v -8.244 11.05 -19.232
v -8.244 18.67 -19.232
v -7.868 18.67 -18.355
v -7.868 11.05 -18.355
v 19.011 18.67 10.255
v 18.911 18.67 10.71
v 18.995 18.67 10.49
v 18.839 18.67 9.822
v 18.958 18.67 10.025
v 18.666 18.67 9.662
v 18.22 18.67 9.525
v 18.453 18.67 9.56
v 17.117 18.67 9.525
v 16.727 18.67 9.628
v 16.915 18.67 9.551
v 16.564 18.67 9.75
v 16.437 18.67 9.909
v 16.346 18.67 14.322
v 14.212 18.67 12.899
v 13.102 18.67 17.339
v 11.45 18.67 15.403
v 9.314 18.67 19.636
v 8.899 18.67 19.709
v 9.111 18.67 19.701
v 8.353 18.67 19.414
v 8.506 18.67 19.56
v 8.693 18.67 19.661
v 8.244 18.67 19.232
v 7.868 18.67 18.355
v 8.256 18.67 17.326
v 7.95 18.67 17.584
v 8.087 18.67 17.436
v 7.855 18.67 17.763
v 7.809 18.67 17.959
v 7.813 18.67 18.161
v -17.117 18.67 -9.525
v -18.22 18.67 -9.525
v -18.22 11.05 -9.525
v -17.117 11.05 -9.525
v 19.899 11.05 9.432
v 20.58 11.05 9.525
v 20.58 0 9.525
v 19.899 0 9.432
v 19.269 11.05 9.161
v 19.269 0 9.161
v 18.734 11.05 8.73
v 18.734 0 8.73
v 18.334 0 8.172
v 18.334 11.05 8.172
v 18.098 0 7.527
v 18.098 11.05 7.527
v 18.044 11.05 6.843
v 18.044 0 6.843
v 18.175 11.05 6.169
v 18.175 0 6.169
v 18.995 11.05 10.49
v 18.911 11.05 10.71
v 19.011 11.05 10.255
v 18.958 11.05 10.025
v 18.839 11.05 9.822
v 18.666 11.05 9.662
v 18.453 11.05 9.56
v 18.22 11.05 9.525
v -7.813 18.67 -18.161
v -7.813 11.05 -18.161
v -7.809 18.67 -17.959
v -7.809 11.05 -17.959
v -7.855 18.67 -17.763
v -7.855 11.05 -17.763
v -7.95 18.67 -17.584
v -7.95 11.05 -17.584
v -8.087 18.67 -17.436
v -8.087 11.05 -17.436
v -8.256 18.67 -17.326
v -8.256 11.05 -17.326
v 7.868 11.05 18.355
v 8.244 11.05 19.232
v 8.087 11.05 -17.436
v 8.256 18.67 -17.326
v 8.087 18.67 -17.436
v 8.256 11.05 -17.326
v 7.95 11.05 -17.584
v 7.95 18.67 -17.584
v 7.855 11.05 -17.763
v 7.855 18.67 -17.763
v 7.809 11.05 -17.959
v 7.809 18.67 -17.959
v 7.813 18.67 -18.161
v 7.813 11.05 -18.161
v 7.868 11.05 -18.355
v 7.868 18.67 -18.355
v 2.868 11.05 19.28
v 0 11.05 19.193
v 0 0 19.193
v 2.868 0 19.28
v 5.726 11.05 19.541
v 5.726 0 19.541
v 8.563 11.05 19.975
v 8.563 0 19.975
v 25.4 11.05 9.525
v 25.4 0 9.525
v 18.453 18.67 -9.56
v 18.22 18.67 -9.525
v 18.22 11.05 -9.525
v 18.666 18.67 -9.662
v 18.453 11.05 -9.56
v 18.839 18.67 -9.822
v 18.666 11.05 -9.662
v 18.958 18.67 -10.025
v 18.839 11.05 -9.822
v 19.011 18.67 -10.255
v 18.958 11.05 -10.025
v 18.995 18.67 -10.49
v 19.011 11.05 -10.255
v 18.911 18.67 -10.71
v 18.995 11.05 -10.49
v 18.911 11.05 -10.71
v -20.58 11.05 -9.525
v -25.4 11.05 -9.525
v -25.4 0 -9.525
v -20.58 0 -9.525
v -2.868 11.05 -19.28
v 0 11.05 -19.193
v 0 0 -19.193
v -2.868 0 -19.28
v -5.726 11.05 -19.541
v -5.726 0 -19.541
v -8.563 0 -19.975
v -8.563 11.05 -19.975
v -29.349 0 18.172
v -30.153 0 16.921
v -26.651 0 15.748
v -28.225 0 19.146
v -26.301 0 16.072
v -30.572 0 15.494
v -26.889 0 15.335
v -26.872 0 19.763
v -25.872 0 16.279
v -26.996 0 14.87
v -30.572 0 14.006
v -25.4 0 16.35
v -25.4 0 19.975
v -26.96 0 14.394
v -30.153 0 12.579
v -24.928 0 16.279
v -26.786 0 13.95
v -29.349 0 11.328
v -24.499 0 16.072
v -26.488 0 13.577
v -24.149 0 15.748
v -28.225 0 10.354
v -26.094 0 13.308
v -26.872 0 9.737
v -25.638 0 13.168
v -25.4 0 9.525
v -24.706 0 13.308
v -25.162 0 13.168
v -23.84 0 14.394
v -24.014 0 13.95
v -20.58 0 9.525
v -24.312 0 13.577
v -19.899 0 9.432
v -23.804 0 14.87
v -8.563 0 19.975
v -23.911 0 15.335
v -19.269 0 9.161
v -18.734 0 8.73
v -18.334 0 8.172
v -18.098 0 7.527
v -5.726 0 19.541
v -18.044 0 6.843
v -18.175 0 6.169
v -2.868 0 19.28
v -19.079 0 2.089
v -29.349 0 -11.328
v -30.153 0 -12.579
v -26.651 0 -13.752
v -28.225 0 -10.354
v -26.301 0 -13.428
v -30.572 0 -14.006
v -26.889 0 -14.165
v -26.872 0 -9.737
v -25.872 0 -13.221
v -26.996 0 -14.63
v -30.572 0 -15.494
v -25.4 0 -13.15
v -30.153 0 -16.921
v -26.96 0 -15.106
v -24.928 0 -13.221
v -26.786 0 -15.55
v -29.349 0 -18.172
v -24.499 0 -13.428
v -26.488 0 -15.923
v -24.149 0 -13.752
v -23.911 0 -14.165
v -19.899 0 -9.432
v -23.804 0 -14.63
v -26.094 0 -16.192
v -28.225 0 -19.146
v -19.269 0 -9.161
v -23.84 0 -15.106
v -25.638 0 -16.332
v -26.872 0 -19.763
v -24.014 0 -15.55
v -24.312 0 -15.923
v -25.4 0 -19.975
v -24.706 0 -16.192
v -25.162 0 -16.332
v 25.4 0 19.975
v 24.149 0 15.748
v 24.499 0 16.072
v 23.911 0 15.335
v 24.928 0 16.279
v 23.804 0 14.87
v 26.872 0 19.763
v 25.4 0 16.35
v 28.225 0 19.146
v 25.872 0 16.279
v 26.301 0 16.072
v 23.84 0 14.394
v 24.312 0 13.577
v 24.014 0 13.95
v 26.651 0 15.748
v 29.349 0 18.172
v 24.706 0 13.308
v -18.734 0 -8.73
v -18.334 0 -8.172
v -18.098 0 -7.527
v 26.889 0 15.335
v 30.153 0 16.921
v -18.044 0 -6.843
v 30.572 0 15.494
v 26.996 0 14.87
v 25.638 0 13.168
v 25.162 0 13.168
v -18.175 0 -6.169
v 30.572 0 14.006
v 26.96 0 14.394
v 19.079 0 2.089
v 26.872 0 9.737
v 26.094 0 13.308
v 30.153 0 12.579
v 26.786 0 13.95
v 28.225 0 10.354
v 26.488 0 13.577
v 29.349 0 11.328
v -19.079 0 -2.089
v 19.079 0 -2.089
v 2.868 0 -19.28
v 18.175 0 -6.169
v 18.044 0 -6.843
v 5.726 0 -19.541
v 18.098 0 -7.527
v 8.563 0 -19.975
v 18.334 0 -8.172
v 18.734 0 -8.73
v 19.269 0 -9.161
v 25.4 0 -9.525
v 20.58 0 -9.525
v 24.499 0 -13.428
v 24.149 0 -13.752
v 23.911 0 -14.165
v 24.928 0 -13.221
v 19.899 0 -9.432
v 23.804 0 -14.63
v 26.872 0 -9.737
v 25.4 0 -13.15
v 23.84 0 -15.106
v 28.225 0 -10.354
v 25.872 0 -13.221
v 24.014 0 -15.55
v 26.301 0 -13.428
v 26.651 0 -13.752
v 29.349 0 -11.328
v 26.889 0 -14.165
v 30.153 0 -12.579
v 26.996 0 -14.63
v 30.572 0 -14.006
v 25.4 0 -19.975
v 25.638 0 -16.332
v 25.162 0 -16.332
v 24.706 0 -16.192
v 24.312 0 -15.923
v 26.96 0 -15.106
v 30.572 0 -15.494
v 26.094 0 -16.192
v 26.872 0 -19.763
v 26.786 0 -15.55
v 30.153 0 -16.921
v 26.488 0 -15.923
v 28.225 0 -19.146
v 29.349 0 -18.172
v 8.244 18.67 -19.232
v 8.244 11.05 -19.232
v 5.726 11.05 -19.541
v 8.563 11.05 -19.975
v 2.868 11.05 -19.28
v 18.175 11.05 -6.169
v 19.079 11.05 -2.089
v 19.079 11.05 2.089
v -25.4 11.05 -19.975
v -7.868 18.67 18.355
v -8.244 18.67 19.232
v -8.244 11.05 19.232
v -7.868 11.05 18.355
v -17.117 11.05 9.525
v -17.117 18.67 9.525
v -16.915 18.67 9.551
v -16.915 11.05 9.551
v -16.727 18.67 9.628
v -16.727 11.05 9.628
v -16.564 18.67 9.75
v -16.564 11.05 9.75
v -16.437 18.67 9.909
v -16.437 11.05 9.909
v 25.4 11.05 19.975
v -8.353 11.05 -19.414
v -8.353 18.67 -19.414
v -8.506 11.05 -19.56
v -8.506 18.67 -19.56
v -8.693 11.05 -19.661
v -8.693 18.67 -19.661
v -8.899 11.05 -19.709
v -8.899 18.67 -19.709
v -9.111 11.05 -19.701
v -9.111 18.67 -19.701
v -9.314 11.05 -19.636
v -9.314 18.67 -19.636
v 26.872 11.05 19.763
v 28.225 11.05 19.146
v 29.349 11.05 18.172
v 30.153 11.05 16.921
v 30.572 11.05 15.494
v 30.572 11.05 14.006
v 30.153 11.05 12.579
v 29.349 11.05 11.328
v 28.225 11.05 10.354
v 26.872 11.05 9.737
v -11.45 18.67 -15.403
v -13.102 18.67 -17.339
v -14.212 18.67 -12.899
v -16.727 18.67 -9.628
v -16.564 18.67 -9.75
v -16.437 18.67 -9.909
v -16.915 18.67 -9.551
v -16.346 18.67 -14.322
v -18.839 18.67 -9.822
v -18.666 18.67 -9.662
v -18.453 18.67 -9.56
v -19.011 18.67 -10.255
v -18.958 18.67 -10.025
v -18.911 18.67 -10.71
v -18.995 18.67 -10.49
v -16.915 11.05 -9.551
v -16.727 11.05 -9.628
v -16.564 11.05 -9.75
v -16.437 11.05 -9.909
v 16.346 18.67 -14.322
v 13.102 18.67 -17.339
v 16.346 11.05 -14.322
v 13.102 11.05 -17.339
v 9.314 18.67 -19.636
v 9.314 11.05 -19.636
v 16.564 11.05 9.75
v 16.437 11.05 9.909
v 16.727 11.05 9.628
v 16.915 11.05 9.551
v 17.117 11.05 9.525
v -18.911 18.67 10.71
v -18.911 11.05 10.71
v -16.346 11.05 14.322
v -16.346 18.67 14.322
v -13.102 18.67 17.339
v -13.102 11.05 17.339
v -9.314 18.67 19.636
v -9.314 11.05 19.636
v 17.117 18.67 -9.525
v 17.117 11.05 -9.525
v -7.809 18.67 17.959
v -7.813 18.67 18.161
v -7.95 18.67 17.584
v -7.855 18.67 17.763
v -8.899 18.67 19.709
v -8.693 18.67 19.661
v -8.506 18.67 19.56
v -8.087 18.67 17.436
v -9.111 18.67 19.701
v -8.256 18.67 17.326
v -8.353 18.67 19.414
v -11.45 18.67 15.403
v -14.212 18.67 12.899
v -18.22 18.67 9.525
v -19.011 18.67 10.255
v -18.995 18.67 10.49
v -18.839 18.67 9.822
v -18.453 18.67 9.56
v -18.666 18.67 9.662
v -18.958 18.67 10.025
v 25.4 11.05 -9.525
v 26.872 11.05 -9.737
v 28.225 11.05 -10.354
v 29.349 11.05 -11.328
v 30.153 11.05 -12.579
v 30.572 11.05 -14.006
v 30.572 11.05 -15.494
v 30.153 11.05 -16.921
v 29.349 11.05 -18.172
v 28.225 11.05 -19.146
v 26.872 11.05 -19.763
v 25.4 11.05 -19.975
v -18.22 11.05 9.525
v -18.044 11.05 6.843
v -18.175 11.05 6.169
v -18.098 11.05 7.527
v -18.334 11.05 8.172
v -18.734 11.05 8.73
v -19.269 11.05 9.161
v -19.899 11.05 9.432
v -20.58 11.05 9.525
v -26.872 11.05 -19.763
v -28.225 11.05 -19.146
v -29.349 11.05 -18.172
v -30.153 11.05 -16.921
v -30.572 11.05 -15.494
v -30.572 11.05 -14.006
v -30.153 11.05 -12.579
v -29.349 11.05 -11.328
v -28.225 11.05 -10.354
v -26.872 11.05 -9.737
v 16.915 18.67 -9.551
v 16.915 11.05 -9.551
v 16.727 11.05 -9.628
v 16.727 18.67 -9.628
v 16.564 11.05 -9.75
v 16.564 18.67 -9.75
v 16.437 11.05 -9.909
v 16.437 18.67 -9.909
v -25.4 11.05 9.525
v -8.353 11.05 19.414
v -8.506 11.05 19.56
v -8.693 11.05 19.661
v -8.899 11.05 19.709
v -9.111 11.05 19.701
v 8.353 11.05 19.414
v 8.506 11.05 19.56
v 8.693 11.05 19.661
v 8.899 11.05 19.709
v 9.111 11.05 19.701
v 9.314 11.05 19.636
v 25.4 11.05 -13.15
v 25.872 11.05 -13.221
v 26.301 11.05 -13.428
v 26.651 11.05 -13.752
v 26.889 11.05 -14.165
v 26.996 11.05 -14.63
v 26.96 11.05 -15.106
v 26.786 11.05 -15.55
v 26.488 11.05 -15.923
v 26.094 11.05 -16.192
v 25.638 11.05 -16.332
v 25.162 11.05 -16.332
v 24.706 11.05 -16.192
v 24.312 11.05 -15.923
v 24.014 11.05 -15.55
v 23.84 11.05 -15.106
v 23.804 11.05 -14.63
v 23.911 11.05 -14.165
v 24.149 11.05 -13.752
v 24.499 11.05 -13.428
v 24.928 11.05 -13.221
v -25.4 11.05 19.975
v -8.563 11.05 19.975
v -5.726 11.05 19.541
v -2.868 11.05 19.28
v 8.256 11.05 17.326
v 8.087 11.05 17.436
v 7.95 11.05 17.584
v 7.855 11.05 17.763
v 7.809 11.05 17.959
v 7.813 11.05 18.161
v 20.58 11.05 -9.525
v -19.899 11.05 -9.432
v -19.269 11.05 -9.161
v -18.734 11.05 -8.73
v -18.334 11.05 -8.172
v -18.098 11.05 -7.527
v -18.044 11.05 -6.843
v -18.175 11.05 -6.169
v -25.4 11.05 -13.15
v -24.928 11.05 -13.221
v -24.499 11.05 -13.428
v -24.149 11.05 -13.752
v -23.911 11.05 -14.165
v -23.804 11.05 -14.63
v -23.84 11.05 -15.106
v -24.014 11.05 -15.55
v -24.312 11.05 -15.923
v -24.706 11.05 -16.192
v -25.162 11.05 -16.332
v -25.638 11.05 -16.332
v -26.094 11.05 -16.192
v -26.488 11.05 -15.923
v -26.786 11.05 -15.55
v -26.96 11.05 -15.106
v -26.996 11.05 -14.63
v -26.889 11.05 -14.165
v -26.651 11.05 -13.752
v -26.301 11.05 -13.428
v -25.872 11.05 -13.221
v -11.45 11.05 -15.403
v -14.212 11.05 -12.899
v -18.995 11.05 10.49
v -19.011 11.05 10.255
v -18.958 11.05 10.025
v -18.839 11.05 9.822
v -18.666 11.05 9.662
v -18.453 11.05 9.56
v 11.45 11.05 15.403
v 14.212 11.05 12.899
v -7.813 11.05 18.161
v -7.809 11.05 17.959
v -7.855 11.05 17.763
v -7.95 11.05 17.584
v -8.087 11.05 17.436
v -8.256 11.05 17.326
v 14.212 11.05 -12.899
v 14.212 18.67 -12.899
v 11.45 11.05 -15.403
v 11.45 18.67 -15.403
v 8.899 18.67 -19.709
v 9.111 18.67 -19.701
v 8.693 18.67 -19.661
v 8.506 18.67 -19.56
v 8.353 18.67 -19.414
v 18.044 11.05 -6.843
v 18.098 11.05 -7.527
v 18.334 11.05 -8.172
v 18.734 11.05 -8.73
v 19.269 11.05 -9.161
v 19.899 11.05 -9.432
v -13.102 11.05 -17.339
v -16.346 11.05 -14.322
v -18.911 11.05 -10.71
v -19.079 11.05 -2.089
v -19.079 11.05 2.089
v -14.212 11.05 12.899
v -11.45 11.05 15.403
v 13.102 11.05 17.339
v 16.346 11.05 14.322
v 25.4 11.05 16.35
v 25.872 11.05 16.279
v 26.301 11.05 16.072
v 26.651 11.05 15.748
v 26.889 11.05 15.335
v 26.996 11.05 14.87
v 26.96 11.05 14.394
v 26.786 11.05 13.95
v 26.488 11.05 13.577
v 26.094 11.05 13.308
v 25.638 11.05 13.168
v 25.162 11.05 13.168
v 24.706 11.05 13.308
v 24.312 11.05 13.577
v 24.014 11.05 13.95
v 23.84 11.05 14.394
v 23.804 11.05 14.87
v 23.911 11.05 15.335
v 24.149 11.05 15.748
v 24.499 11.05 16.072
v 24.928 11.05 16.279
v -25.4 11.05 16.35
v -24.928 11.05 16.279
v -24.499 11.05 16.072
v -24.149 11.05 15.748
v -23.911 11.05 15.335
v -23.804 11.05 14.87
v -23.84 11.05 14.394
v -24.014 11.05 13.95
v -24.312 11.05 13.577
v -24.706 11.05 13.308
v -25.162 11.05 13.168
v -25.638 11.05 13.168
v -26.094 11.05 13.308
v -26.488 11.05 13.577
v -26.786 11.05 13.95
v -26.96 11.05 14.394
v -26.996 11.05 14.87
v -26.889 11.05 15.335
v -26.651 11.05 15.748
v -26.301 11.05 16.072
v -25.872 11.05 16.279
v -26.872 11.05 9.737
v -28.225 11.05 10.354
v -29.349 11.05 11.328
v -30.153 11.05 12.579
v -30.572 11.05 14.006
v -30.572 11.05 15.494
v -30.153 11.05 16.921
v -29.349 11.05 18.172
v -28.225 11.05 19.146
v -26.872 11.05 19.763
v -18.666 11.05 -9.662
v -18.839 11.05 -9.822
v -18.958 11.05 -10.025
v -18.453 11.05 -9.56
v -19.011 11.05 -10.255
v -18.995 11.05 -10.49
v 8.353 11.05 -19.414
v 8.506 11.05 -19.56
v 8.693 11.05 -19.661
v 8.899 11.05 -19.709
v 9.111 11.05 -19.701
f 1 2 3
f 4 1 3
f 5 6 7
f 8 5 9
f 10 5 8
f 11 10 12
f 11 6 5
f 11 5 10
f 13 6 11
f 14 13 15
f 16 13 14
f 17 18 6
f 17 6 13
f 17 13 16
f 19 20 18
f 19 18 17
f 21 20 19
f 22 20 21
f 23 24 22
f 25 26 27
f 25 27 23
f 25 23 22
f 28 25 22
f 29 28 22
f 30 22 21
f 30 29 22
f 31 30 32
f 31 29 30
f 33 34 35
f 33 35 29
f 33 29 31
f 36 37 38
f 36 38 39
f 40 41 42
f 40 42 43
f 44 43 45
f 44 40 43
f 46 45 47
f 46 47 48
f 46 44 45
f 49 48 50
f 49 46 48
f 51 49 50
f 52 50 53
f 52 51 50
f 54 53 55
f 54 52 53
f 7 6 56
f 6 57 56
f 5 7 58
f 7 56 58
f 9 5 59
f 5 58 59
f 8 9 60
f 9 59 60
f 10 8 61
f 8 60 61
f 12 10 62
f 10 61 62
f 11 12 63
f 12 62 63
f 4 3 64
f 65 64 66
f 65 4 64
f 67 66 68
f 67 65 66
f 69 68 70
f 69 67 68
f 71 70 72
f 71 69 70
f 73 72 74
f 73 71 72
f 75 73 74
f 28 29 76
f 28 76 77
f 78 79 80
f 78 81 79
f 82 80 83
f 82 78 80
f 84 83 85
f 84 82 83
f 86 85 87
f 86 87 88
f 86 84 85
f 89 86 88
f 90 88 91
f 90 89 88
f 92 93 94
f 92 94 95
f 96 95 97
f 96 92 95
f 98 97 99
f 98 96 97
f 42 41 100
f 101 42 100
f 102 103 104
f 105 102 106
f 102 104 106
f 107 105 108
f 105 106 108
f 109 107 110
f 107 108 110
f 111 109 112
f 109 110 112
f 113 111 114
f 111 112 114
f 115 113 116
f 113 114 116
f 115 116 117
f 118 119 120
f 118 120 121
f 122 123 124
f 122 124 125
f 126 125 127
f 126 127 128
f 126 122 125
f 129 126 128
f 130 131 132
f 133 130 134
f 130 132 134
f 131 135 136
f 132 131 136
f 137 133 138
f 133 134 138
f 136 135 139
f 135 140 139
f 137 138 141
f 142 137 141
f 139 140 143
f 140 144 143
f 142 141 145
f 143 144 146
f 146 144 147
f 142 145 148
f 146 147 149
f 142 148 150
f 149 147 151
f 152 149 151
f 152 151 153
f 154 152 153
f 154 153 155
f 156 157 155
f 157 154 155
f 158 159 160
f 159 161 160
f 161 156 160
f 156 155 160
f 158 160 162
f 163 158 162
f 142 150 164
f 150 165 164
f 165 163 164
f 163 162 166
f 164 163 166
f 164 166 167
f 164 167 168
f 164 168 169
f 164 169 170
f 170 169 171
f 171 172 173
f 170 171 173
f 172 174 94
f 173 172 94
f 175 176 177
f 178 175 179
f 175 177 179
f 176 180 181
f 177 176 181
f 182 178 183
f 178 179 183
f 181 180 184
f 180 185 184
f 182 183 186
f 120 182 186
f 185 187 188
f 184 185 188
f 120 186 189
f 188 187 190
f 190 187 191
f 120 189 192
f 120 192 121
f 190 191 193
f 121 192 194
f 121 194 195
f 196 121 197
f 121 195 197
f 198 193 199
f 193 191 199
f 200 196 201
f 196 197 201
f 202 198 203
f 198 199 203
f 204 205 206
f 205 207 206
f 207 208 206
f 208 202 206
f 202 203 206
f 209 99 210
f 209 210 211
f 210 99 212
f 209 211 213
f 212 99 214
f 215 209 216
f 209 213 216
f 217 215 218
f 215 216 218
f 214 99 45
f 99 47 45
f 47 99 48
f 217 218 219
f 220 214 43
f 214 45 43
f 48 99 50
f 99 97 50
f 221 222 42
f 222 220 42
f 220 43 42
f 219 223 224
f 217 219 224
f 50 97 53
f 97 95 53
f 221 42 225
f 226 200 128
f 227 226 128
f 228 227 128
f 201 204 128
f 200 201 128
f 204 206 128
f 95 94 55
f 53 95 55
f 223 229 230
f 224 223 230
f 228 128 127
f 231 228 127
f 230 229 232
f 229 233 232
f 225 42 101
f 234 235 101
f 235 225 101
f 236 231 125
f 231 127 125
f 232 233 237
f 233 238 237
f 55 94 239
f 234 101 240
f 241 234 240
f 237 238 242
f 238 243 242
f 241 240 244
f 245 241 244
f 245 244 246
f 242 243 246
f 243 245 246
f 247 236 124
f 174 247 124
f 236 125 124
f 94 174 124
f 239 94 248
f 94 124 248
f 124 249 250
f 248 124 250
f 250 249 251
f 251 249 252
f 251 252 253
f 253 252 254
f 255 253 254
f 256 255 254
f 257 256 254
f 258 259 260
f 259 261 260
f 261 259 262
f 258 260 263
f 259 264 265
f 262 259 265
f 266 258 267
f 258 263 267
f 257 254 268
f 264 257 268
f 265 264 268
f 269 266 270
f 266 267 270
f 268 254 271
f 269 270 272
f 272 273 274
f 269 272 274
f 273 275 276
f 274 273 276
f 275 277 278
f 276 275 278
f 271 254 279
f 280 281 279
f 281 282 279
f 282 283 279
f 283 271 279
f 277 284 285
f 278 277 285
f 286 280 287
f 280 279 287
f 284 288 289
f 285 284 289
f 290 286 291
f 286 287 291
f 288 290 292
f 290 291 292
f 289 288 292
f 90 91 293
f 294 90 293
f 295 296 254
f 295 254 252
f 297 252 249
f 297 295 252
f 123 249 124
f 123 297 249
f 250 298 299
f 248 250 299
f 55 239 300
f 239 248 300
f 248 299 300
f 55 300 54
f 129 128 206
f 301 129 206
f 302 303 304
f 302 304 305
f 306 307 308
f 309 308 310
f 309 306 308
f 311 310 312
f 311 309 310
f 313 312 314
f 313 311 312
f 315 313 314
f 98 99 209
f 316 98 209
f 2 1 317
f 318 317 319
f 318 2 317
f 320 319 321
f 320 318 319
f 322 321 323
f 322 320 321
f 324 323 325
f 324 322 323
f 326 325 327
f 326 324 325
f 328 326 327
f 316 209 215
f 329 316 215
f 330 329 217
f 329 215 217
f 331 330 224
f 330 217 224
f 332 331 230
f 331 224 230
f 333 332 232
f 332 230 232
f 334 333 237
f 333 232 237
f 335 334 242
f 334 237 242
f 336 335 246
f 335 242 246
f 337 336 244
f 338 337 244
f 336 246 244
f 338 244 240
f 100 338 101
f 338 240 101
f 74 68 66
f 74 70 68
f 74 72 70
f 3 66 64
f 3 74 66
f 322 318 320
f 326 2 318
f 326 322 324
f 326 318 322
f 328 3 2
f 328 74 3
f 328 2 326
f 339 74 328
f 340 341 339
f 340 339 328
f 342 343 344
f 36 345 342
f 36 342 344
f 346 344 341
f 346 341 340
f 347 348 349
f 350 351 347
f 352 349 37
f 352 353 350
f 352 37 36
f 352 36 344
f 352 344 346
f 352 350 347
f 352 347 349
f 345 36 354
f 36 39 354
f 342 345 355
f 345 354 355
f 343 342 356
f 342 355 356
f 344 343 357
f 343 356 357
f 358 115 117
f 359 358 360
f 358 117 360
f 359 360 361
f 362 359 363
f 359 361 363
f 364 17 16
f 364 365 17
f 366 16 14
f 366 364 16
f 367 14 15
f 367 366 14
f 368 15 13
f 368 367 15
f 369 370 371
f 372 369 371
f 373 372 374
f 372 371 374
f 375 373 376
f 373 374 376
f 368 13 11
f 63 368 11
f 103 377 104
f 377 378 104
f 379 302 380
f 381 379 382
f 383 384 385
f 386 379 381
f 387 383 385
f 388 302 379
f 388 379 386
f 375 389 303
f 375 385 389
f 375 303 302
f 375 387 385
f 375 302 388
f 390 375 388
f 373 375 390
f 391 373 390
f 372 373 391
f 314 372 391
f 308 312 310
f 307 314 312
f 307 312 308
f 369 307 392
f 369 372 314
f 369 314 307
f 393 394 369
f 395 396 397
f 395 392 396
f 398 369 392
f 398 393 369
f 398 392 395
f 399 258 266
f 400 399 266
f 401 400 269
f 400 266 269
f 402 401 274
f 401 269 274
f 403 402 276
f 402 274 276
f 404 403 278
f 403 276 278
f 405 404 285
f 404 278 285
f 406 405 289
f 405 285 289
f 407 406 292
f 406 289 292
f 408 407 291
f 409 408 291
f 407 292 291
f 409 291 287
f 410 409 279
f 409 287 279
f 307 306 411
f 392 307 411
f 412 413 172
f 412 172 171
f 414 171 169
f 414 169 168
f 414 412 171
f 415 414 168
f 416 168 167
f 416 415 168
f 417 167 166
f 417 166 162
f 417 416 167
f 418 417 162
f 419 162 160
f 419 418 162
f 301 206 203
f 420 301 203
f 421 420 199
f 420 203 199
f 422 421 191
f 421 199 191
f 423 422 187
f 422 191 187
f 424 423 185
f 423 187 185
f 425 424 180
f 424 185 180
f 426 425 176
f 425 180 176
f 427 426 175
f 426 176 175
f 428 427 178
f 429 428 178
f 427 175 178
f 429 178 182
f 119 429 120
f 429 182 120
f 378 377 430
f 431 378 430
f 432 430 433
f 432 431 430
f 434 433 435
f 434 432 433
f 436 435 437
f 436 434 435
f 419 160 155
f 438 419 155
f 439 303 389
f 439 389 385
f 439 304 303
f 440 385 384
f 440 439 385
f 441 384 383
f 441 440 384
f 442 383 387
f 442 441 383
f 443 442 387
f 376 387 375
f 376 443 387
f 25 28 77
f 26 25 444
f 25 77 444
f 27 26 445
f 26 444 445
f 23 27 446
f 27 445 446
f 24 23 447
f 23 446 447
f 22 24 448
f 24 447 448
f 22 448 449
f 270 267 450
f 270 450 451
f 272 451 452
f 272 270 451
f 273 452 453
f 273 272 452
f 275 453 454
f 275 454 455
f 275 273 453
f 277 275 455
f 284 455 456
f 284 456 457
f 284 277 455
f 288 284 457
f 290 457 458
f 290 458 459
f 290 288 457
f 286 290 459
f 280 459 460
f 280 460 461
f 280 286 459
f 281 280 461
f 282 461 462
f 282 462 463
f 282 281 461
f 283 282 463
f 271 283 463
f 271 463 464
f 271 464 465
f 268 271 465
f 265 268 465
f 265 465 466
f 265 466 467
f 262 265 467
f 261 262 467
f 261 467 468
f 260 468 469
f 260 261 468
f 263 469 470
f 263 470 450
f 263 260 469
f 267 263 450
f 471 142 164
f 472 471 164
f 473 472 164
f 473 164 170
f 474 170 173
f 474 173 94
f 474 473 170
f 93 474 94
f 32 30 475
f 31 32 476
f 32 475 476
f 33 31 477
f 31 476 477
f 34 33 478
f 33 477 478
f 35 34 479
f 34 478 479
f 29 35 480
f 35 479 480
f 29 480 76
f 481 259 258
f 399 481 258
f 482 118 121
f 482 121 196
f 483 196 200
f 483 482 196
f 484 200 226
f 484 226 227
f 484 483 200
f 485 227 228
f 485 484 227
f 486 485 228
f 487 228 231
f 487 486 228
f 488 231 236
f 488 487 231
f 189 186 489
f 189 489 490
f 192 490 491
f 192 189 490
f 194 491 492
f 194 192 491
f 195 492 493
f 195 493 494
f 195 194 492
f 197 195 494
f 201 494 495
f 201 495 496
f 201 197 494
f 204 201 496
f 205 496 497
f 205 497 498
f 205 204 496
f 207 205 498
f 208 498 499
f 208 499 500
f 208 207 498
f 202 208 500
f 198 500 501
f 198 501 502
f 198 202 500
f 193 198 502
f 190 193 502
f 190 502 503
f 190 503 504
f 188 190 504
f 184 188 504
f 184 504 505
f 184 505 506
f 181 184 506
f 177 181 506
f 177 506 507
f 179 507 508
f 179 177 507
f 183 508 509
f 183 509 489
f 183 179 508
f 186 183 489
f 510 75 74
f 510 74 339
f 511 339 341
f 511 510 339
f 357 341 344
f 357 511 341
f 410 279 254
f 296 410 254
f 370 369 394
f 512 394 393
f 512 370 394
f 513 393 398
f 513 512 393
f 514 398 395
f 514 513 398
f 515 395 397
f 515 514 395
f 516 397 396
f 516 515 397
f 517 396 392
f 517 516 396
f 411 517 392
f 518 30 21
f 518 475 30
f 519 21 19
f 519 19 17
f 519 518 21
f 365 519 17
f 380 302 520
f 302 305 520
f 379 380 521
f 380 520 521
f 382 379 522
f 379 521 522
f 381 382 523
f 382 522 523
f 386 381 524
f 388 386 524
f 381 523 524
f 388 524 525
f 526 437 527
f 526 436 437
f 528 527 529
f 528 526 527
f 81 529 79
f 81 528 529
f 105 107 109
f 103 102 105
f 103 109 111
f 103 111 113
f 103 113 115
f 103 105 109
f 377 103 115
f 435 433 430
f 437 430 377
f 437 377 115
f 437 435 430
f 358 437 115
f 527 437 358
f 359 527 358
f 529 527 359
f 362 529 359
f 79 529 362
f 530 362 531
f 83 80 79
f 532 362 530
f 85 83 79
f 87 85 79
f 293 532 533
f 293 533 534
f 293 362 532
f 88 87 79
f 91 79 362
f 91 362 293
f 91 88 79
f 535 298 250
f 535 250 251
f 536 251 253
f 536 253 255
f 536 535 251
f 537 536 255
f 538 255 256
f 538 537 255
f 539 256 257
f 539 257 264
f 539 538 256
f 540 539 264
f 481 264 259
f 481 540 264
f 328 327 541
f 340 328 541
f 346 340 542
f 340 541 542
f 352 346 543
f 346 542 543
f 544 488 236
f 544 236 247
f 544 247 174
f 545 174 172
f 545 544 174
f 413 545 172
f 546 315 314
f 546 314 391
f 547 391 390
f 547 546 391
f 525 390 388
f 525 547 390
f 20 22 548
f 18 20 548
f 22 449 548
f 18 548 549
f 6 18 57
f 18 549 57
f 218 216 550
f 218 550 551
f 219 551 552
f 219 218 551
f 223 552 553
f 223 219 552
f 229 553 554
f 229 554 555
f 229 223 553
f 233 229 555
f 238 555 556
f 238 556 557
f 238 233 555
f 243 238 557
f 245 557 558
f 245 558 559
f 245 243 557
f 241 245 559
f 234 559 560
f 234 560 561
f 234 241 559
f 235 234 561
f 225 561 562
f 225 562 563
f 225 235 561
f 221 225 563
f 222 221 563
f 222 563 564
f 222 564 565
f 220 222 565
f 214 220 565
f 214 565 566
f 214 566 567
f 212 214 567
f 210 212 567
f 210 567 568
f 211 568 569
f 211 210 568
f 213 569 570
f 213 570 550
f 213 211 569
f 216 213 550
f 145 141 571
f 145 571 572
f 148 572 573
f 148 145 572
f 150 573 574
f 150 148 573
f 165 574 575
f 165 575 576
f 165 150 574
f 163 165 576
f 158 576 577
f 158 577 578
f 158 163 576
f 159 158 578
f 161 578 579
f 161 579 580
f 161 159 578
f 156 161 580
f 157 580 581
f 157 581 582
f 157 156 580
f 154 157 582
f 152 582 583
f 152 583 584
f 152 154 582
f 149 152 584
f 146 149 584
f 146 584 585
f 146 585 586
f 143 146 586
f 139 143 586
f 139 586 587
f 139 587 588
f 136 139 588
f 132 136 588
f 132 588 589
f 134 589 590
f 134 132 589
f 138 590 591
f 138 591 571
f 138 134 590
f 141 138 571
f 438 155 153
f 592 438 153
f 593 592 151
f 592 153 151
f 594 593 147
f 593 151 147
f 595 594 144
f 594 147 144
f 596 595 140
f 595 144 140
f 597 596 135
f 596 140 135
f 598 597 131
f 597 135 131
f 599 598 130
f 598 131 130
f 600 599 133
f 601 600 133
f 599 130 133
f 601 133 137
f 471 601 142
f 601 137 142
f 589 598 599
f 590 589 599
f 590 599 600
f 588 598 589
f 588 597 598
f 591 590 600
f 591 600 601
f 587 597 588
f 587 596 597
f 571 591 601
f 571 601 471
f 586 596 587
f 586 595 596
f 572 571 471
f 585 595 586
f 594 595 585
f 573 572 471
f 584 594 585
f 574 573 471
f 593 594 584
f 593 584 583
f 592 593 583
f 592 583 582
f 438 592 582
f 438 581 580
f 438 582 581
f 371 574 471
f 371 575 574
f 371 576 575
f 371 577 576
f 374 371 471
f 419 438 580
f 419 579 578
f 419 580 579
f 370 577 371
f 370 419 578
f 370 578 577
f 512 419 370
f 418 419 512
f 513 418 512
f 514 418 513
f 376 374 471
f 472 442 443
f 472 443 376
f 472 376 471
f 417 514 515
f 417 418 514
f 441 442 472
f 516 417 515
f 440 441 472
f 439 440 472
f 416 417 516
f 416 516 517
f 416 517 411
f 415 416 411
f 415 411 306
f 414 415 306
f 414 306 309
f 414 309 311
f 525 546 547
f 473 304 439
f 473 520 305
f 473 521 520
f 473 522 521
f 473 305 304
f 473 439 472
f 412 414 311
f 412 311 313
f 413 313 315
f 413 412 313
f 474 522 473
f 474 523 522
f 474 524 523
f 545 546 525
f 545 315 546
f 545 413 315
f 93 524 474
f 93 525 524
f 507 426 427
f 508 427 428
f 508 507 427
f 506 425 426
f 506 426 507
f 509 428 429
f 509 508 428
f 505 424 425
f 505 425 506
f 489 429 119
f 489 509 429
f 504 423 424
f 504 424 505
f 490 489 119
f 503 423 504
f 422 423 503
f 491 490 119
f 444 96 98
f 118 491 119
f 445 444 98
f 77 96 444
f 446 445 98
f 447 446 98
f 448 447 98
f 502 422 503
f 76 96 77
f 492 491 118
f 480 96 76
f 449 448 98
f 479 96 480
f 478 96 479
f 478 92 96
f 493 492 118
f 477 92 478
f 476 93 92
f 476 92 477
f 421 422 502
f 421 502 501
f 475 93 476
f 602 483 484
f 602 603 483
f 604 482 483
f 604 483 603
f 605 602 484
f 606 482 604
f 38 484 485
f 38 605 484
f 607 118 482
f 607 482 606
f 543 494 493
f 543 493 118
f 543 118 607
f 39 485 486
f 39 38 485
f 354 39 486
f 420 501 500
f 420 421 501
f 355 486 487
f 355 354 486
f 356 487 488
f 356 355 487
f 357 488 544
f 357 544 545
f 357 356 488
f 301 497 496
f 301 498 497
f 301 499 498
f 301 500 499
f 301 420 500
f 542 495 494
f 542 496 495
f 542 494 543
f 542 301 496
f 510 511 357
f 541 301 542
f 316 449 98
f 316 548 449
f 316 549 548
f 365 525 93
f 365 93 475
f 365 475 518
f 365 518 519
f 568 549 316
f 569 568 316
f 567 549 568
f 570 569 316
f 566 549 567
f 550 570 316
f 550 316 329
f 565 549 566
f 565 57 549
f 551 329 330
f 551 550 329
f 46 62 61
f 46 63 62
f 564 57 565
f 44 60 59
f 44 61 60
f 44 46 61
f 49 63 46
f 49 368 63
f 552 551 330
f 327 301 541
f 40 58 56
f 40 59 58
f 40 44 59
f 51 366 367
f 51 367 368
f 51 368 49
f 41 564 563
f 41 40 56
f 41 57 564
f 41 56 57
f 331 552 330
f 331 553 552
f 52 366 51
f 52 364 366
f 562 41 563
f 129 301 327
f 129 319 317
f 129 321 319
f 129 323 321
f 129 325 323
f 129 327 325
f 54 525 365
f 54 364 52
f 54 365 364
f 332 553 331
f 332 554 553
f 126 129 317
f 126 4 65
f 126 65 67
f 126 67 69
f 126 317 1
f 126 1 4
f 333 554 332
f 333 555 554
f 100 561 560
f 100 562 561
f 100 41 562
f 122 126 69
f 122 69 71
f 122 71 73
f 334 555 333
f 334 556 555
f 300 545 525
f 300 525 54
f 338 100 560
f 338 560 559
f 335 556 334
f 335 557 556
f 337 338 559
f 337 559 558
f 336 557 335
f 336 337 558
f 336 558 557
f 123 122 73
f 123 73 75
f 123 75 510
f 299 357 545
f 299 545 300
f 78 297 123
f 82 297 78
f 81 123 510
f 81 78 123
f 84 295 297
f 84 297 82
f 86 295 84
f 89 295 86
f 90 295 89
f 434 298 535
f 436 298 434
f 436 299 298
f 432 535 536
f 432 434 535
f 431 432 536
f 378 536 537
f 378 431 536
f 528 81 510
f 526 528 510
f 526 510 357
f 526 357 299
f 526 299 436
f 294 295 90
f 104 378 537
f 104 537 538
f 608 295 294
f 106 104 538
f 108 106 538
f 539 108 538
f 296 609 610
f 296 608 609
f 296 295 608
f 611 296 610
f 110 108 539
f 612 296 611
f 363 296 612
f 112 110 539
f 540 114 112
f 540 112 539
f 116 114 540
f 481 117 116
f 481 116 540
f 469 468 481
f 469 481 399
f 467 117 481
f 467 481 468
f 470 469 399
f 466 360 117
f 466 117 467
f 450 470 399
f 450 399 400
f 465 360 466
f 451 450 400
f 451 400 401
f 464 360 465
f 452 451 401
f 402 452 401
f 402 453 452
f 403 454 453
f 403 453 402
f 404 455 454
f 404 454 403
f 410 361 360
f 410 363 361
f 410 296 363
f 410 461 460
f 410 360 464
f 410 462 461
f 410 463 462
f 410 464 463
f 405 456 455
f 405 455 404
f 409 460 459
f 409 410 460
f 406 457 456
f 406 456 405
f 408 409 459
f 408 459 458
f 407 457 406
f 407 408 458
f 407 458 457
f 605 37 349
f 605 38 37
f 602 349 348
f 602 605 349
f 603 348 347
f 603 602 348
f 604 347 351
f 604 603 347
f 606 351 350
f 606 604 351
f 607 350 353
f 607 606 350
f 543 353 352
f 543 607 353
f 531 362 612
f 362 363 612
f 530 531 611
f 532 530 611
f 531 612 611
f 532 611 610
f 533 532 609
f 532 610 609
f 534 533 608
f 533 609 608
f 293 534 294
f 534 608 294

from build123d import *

# Parameters (mm, degrees)
SKETCH1_R           = 1.6
SKETCH1_R_2         = 21.732875
SKETCH1_R_3         = 19.192875
BOSS_EXTRUDE1_DEPTH = 11.05
BOSS_EXTRUDE2_START = 11.05
SKETCH1_3_R         = 21.732875
SKETCH1_3_R_2       = 19.192875
BOSS_EXTRUDE2_DEPTH = 7.62
CUT_EXTRUDE1_DEPTH  = 42.937776077
FILLET2_R           = 0.79375
FILLET4_R           = 2.54
FILLET5_R           = 2.54
FILLET6_R           = 2.54
FILLET7_R           = 2.54
BOSS_EXTRUDE3_DEPTH = 11.05


with BuildPart() as part:
    # Sketch1 → Boss-Extrude1 (new body)
    # profile 1 of 6: a face of its own
    with BuildSketch(Plane(origin=(0, 0, 0), x_dir=(1, 0, 0), z_dir=(0, 1, 0))):
        with BuildLine():
            Line((-8.562572408, 19.9749896), (-25.4, 19.9749896))
            ThreePointArc((-25.4, 19.9749896), (-30.6249948, 14.7499948), (-25.4, 9.525))
            Line((-25.4, 9.525), (-19.534385856, 9.525))
            ThreePointArc((-19.534385856, 9.525), (-14.98867361, 15.737138215), (-8.562572408, 19.9749896))
        make_face()
        with Locations(Location((-25.4, 14.7499948, 0), (0, 0, 270))):
            Circle(SKETCH1_R, mode=Mode.SUBTRACT)
    # profile 2 of 6: a face of its own
    with BuildSketch(Plane(origin=(0, 0, 0), x_dir=(1, 0, 0), z_dir=(0, 1, 0))):
        Circle(SKETCH1_R_2)
        Circle(SKETCH1_R_3, mode=Mode.SUBTRACT)
    # profile 3 of 6: a face of its own
    with BuildSketch(Plane(origin=(0, 0, 0), x_dir=(1, 0, 0), z_dir=(0, 1, 0))):
        with BuildLine():
            Line((25.4, 19.9749896), (8.562572408, 19.9749896))
            ThreePointArc((8.562572408, 19.9749896), (14.98867361, 15.737138215), (19.534385856, 9.525))
            Line((19.534385856, 9.525), (25.4, 9.525))
            ThreePointArc((25.4, 9.525), (30.6249948, 14.7499948), (25.4, 19.9749896))
        make_face()
        with Locations(Location((25.4, 14.7499948, 0), (0, 0, 270))):
            Circle(SKETCH1_R, mode=Mode.SUBTRACT)
    # profile 4 of 6: a face of its own
    with BuildSketch(Plane(origin=(0, 0, 0), x_dir=(1, 0, 0), z_dir=(0, 1, 0))):
        with BuildLine():
            Line((25.4, -9.525), (19.534385856, -9.525))
            ThreePointArc((19.534385856, -9.525), (14.98867361, -15.737138215), (8.562572408, -19.9749896))
            Line((8.562572408, -19.9749896), (25.4, -19.9749896))
            ThreePointArc((25.4, -19.9749896), (30.6249948, -14.7499948), (25.4, -9.525))
        make_face()
        with Locations(Location((25.4, -14.7499948, 0), (0, 0, 270))):
            Circle(SKETCH1_R, mode=Mode.SUBTRACT)
    # profile 5 of 6: a face of its own
    with BuildSketch(Plane(origin=(0, 0, 0), x_dir=(1, 0, 0), z_dir=(0, 1, 0))):
        with BuildLine():
            ThreePointArc((-8.562572408, -19.9749896), (-14.98867361, -15.737138215), (-19.534385856, -9.525))
            Line((-19.534385856, -9.525), (-25.4, -9.525))
            ThreePointArc((-25.4, -9.525), (-30.6249948, -14.7499948), (-25.4, -19.9749896))
            Line((-25.4, -19.9749896), (-8.562572408, -19.9749896))
        make_face()
        with Locations(Location((-25.4, -14.7499948, 0), (0, 0, 270))):
            Circle(SKETCH1_R, mode=Mode.SUBTRACT)
    # profile 6 of 6: a face of its own
    with BuildSketch(Plane(origin=(0, 0, 0), x_dir=(1, 0, 0), z_dir=(0, 1, 0))):
        Circle(SKETCH1_R_3)
    extrude(amount=BOSS_EXTRUDE1_DEPTH)

    # Sketch1<3> → Boss-Extrude2 (add)
    with BuildSketch(Plane(origin=(0, 0, 0), x_dir=(1, 0, 0), z_dir=(0, 1, 0)).offset(BOSS_EXTRUDE2_START)):
        with Locations(Location((0, 0, 0), (0, 0, 113.203103919))):
            Circle(SKETCH1_3_R)
        with Locations(Location((0, 0, 0), (0, 0, 90))):
            Circle(SKETCH1_3_R_2, mode=Mode.SUBTRACT)
    extrude(amount=BOSS_EXTRUDE2_DEPTH)

    # Sketch2 → Cut-Extrude1 (cut, through all)
    with BuildSketch(Plane(origin=(0, 18.67, 0), x_dir=(1, 0, 0), z_dir=(0, 1, 0))):
        with BuildLine():
            Line((-19.534385856, 9.525), (-16.6625576, 9.525))
            ThreePointArc((-16.6625576, 9.525), (-19.192875, 0), (-16.6625576, -9.525))
            Line((-16.6625576, -9.525), (-19.534385856, -9.525))
            ThreePointArc((-19.534385856, -9.525), (-21.732875, 0), (-19.534385856, 9.525))
        make_face()
        with BuildLine():
            Line((19.534385856, 9.525), (16.6625576, 9.525))
            ThreePointArc((16.6625576, 9.525), (19.192875, 0), (16.6625576, -9.525))
            Line((16.6625576, -9.525), (19.534385856, -9.525))
            ThreePointArc((19.534385856, -9.525), (21.732875, 0), (19.534385856, 9.525))
        make_face()
        with BuildLine():
            Line((-8.562572408, 19.9749896), (-7.561833485, 17.640440049))
            ThreePointArc((-7.561833485, 17.640440049), (0, 19.192875), (7.561833485, 17.640440049))
            Line((7.561833485, 17.640440049), (8.562572408, 19.9749896))
            ThreePointArc((8.562572408, 19.9749896), (0, 21.732875), (-8.562572408, 19.9749896))
        make_face()
        with BuildLine():
            Line((-8.562572408, -19.9749896), (-7.561833485, -17.640440049))
            ThreePointArc((-7.561833485, -17.640440049), (0, -19.192875), (7.561833485, -17.640440049))
            Line((7.561833485, -17.640440049), (8.562572408, -19.9749896))
            ThreePointArc((8.562572408, -19.9749896), (0, -21.732875), (-8.562572408, -19.9749896))
        make_face()
    extrude(amount=-CUT_EXTRUDE1_DEPTH, mode=Mode.SUBTRACT)

    # Fillet2
    fillet2_edges = [part.edges().sort_by_distance(p)[0] for p in [
        (16.6625576, 14.86, 9.525),
        (19.534385856, 14.86, -9.525),
        (19.534385856, 14.86, 9.525),
        (16.6625576, 14.86, -9.525),
        (7.561833485, 14.86, -17.640440049),
        (-8.562572408, 14.86, -19.9749896),
        (8.562572408, 14.86, -19.9749896),
        (-7.561833485, 14.86, -17.640440049),
        (-16.6625576, 14.86, -9.525),
        (-19.534385856, 14.86, 9.525),
        (-19.534385856, 14.86, -9.525),
        (-16.6625576, 14.86, 9.525),
        (-7.561833485, 14.86, 17.640440049),
        (8.562572408, 14.86, 19.9749896),
        (-8.562572408, 14.86, 19.9749896),
        (7.561833485, 14.86, 17.640440049),
    ]]
    fillet(fillet2_edges, radius=FILLET2_R)

    # Fillet4
    # the kernel refuses this fillet: 2.54 mm, written as the material it adds along each edge
    with BuildSketch(Plane(origin=(16.6625576, 11.05, 9.525), x_dir=(1, 0, 0), z_dir=(0, -1, 0))) as fillet4_piece_1:
        with BuildLine():
            CenterArc((3.917229347, -2.54), FILLET4_R, 90, 108.747762366)
            ThreePointArc((1.511994934, -3.356362308), (0.836652457, -1.641847194), (0, 0))
            Line((0, 0), (3.917229347, 0))
        make_face()
    extrude(amount=11.05)

    # Fillet5
    # the kernel refuses this fillet: 2.54 mm, written as the material it adds along each edge
    with BuildSketch(Plane(origin=(16.6625576, 11.05, -9.525), x_dir=(0.41073329589504654, 0, 0.9117555372155368), z_dir=(0, -1, 0))) as fillet5_piece_1:
        with BuildLine():
            CenterArc((3.924795585, -2.528292976), FILLET5_R, 95.503145264, 108.747762366)
            Line((1.60893652, -3.571555547), (0, 0))
            ThreePointArc((0, 0), (1.840604291, -0.088461201), (3.681208582, 0))
        make_face()
    extrude(amount=11.05)

    # Fillet6
    # the kernel refuses this fillet: 2.54 mm, written as the material it adds along each edge
    with BuildSketch(Plane(origin=(-16.6625576, 11.05, -9.525), x_dir=(-1, 0, 0), z_dir=(0, -1, 0))) as fillet6_piece_1:
        with BuildLine():
            CenterArc((3.917229347, -2.54), FILLET6_R, 90, 108.747762366)
            ThreePointArc((1.511994934, -3.356362308), (0.836652457, -1.641847194), (0, 0))
            Line((0, 0), (3.917229347, 0))
        make_face()
    extrude(amount=11.05)

    # Fillet7
    # the kernel refuses this fillet: 2.54 mm, written as the material it adds along each edge
    with BuildSketch(Plane(origin=(-16.6625576, 11.05, 9.525), x_dir=(-0.41073329589504604, 0, -0.9117555372155371), z_dir=(0, -1, 0))) as fillet7_piece_1:
        with BuildLine():
            CenterArc((3.924795585, -2.528292976), FILLET7_R, 95.503145264, 108.747762366)
            Line((1.60893652, -3.571555547), (0, 0))
            ThreePointArc((0, 0), (1.840604291, -0.088461201), (3.681208582, 0))
        make_face()
    extrude(amount=11.05)

    # Sketch3 → Boss-Extrude3 (add)
    with BuildSketch(Plane(origin=(0, 11.05, 0), x_dir=(1, 0, 0), z_dir=(0, 1, 0))):
        with BuildLine():
            ThreePointArc((9.7e-08, 19.192875), (3.859772707, 18.800760767), (7.561833485, 17.640440049))
            Line((7.561833485, 17.640440049), (8.562572408, 19.9749896))
            ThreePointArc((8.562572408, 19.9749896), (4.299108953, 19.388809795), (9.7e-08, 19.192875))
        make_face()
        with BuildLine():
            ThreePointArc((-7.561833485, 17.640440049), (-3.859772612, 18.800760786), (9.7e-08, 19.192875))
            ThreePointArc((9.7e-08, 19.192875), (-4.299108856, 19.388809786), (-8.562572408, 19.9749896))
            Line((-8.562572408, 19.9749896), (-7.561833485, 17.640440049))
        make_face()
        with BuildLine():
            ThreePointArc((7.561833485, -17.640440049), (3.859772707, -18.800760767), (9.7e-08, -19.192875))
            ThreePointArc((9.7e-08, -19.192875), (4.299108953, -19.388809795), (8.562572408, -19.9749896))
            Line((8.562572408, -19.9749896), (7.561833485, -17.640440049))
        make_face()
        with BuildLine():
            Line((-7.561833485, -17.640440049), (-8.562572408, -19.9749896))
            ThreePointArc((-8.562572408, -19.9749896), (-4.299108856, -19.388809786), (9.7e-08, -19.192875))
            ThreePointArc((9.7e-08, -19.192875), (-3.859772612, -18.800760786), (-7.561833485, -17.640440049))
        make_face()
    extrude(amount=-BOSS_EXTRUDE3_DEPTH)


solid = part.part
